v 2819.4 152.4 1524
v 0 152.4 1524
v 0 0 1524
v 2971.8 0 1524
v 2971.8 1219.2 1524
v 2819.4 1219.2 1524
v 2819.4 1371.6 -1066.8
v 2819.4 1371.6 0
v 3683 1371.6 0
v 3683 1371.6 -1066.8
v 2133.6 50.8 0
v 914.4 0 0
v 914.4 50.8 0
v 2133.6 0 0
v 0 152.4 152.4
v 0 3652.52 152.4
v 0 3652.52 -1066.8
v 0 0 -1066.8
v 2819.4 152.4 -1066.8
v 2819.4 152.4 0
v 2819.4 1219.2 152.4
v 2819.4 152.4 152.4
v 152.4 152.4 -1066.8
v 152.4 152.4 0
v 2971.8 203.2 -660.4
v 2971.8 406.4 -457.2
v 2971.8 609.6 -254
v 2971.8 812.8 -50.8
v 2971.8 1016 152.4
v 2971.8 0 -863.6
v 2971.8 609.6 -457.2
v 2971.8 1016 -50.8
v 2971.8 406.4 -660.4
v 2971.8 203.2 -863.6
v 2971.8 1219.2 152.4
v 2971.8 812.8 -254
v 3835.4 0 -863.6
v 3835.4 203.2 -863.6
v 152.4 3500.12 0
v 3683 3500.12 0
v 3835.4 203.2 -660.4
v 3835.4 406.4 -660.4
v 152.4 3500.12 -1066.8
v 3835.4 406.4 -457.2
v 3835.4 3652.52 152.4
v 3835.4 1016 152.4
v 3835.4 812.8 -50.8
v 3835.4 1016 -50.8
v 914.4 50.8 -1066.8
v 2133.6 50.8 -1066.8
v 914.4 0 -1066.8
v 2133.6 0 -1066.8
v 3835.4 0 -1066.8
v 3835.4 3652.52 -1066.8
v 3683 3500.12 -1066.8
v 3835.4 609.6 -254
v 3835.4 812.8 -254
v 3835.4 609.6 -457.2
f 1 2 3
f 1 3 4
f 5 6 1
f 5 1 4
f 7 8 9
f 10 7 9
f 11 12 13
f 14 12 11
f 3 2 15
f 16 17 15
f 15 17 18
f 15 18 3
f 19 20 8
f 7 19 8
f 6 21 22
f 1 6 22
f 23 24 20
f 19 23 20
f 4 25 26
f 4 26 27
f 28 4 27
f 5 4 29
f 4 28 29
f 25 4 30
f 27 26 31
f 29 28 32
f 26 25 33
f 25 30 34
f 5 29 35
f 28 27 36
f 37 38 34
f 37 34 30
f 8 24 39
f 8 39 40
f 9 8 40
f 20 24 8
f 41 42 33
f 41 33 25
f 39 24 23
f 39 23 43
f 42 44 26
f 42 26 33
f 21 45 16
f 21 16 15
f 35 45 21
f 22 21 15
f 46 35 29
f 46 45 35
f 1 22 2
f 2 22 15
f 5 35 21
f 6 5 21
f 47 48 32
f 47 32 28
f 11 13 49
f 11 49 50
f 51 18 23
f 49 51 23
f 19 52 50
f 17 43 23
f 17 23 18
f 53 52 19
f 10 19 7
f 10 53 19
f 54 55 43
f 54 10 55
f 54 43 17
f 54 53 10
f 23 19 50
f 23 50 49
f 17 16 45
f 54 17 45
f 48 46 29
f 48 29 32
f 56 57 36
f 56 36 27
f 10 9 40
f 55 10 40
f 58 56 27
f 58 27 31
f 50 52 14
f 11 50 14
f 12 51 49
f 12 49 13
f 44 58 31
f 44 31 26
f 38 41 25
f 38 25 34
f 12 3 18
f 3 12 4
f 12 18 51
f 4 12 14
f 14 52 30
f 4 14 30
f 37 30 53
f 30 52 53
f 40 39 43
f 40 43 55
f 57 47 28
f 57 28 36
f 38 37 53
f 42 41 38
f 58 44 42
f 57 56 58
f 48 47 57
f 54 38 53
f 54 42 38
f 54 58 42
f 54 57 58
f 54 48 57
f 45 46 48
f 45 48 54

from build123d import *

# Parameters (mm, degrees)
F0_W      = 3835.4
F0_H      = 3652.52
F0_W_2    = 3530.6
F0_H_2    = 3347.72
F1_DEPTH  = 1066.8
F2_W      = 3835.4
F2_H      = 152.4
F3_DEPTH  = 3652.52
F4_W      = 863.6
F4_H      = 1219.2
F5_DEPTH  = 1219.2
F7_DEPTH  = 1066.8
F8_W      = 1219.2
F8_H      = 1066.8
F9_DEPTH  = 50.8
F11_DEPTH = 863.6
F13_DEPTH = 1371.6


with BuildPart() as f1:
    # F0 (on Top) → F1 (new body)
    with BuildSketch(Plane.XY):
        with Locations((1917.7, 1826.26)):
            Rectangle(F0_W, F0_H)
        with Locations((1917.7, 1826.26)):
            Rectangle(F0_W_2, F0_H_2, mode=Mode.SUBTRACT)
    extrude(amount=-F1_DEPTH)

    # F2 (on face) → F3 (join, through all)
    with BuildSketch(Plane.XZ):
        with Locations((1917.7, 76.2)):
            Rectangle(F2_W, F2_H)
    extrude(amount=-F3_DEPTH)

    # F4 (on face) → F5 (cut, through all)
    with BuildSketch(Plane.XY.offset(152.4)):
        with Locations((3403.6, 609.6)):
            Rectangle(F4_W, F4_H)
    extrude(amount=-F5_DEPTH, mode=Mode.SUBTRACT)

    # F6 (on face) → F7 (join, through all)
    with BuildSketch(Plane(origin=(0, 0, 0), x_dir=(1, 0, 0), z_dir=(0, 0, -1))):
        Polygon((2819.4, -152.4), (2819.4, -1371.6), (3683, -1371.6), (3683, -1219.2), (2971.8, -1219.2), (2971.8, -152.4), align=None)
    extrude(amount=F7_DEPTH)

    # F8 (on face) → F9 (cut)
    with BuildSketch(Plane.XZ):
        with Locations((1524, -533.4)):
            Rectangle(F8_W, F8_H)
    extrude(amount=-F9_DEPTH, mode=Mode.SUBTRACT)

    # F10 (on face) → F11 (join, through all)
    with BuildSketch(Plane.YZ.offset(3835.4)):
        Polygon((0, -1066.8), (1219.2, -1066.8), (1219.2, 152.4), (1016, 152.4), (1016, -50.8), (812.8, -50.8), (812.8, -254), (609.6, -254), (609.6, -457.2), (406.4, -457.2), (406.4, -660.4), (203.2, -660.4), (203.2, -863.6), (0, -863.6), align=None)
    extrude(amount=-F11_DEPTH)

    # F12 (on face) → F13 (join)
    with BuildSketch(Plane.XY.offset(152.4)):
        Polygon((0, 152.4), (0, 0), (2971.8, 0), (2971.8, 152.4), (2971.8, 1016), (2971.8, 1219.2), (2819.4, 1219.2), (2819.4, 152.4), align=None)
    extrude(amount=F13_DEPTH)


solid = f1.part
